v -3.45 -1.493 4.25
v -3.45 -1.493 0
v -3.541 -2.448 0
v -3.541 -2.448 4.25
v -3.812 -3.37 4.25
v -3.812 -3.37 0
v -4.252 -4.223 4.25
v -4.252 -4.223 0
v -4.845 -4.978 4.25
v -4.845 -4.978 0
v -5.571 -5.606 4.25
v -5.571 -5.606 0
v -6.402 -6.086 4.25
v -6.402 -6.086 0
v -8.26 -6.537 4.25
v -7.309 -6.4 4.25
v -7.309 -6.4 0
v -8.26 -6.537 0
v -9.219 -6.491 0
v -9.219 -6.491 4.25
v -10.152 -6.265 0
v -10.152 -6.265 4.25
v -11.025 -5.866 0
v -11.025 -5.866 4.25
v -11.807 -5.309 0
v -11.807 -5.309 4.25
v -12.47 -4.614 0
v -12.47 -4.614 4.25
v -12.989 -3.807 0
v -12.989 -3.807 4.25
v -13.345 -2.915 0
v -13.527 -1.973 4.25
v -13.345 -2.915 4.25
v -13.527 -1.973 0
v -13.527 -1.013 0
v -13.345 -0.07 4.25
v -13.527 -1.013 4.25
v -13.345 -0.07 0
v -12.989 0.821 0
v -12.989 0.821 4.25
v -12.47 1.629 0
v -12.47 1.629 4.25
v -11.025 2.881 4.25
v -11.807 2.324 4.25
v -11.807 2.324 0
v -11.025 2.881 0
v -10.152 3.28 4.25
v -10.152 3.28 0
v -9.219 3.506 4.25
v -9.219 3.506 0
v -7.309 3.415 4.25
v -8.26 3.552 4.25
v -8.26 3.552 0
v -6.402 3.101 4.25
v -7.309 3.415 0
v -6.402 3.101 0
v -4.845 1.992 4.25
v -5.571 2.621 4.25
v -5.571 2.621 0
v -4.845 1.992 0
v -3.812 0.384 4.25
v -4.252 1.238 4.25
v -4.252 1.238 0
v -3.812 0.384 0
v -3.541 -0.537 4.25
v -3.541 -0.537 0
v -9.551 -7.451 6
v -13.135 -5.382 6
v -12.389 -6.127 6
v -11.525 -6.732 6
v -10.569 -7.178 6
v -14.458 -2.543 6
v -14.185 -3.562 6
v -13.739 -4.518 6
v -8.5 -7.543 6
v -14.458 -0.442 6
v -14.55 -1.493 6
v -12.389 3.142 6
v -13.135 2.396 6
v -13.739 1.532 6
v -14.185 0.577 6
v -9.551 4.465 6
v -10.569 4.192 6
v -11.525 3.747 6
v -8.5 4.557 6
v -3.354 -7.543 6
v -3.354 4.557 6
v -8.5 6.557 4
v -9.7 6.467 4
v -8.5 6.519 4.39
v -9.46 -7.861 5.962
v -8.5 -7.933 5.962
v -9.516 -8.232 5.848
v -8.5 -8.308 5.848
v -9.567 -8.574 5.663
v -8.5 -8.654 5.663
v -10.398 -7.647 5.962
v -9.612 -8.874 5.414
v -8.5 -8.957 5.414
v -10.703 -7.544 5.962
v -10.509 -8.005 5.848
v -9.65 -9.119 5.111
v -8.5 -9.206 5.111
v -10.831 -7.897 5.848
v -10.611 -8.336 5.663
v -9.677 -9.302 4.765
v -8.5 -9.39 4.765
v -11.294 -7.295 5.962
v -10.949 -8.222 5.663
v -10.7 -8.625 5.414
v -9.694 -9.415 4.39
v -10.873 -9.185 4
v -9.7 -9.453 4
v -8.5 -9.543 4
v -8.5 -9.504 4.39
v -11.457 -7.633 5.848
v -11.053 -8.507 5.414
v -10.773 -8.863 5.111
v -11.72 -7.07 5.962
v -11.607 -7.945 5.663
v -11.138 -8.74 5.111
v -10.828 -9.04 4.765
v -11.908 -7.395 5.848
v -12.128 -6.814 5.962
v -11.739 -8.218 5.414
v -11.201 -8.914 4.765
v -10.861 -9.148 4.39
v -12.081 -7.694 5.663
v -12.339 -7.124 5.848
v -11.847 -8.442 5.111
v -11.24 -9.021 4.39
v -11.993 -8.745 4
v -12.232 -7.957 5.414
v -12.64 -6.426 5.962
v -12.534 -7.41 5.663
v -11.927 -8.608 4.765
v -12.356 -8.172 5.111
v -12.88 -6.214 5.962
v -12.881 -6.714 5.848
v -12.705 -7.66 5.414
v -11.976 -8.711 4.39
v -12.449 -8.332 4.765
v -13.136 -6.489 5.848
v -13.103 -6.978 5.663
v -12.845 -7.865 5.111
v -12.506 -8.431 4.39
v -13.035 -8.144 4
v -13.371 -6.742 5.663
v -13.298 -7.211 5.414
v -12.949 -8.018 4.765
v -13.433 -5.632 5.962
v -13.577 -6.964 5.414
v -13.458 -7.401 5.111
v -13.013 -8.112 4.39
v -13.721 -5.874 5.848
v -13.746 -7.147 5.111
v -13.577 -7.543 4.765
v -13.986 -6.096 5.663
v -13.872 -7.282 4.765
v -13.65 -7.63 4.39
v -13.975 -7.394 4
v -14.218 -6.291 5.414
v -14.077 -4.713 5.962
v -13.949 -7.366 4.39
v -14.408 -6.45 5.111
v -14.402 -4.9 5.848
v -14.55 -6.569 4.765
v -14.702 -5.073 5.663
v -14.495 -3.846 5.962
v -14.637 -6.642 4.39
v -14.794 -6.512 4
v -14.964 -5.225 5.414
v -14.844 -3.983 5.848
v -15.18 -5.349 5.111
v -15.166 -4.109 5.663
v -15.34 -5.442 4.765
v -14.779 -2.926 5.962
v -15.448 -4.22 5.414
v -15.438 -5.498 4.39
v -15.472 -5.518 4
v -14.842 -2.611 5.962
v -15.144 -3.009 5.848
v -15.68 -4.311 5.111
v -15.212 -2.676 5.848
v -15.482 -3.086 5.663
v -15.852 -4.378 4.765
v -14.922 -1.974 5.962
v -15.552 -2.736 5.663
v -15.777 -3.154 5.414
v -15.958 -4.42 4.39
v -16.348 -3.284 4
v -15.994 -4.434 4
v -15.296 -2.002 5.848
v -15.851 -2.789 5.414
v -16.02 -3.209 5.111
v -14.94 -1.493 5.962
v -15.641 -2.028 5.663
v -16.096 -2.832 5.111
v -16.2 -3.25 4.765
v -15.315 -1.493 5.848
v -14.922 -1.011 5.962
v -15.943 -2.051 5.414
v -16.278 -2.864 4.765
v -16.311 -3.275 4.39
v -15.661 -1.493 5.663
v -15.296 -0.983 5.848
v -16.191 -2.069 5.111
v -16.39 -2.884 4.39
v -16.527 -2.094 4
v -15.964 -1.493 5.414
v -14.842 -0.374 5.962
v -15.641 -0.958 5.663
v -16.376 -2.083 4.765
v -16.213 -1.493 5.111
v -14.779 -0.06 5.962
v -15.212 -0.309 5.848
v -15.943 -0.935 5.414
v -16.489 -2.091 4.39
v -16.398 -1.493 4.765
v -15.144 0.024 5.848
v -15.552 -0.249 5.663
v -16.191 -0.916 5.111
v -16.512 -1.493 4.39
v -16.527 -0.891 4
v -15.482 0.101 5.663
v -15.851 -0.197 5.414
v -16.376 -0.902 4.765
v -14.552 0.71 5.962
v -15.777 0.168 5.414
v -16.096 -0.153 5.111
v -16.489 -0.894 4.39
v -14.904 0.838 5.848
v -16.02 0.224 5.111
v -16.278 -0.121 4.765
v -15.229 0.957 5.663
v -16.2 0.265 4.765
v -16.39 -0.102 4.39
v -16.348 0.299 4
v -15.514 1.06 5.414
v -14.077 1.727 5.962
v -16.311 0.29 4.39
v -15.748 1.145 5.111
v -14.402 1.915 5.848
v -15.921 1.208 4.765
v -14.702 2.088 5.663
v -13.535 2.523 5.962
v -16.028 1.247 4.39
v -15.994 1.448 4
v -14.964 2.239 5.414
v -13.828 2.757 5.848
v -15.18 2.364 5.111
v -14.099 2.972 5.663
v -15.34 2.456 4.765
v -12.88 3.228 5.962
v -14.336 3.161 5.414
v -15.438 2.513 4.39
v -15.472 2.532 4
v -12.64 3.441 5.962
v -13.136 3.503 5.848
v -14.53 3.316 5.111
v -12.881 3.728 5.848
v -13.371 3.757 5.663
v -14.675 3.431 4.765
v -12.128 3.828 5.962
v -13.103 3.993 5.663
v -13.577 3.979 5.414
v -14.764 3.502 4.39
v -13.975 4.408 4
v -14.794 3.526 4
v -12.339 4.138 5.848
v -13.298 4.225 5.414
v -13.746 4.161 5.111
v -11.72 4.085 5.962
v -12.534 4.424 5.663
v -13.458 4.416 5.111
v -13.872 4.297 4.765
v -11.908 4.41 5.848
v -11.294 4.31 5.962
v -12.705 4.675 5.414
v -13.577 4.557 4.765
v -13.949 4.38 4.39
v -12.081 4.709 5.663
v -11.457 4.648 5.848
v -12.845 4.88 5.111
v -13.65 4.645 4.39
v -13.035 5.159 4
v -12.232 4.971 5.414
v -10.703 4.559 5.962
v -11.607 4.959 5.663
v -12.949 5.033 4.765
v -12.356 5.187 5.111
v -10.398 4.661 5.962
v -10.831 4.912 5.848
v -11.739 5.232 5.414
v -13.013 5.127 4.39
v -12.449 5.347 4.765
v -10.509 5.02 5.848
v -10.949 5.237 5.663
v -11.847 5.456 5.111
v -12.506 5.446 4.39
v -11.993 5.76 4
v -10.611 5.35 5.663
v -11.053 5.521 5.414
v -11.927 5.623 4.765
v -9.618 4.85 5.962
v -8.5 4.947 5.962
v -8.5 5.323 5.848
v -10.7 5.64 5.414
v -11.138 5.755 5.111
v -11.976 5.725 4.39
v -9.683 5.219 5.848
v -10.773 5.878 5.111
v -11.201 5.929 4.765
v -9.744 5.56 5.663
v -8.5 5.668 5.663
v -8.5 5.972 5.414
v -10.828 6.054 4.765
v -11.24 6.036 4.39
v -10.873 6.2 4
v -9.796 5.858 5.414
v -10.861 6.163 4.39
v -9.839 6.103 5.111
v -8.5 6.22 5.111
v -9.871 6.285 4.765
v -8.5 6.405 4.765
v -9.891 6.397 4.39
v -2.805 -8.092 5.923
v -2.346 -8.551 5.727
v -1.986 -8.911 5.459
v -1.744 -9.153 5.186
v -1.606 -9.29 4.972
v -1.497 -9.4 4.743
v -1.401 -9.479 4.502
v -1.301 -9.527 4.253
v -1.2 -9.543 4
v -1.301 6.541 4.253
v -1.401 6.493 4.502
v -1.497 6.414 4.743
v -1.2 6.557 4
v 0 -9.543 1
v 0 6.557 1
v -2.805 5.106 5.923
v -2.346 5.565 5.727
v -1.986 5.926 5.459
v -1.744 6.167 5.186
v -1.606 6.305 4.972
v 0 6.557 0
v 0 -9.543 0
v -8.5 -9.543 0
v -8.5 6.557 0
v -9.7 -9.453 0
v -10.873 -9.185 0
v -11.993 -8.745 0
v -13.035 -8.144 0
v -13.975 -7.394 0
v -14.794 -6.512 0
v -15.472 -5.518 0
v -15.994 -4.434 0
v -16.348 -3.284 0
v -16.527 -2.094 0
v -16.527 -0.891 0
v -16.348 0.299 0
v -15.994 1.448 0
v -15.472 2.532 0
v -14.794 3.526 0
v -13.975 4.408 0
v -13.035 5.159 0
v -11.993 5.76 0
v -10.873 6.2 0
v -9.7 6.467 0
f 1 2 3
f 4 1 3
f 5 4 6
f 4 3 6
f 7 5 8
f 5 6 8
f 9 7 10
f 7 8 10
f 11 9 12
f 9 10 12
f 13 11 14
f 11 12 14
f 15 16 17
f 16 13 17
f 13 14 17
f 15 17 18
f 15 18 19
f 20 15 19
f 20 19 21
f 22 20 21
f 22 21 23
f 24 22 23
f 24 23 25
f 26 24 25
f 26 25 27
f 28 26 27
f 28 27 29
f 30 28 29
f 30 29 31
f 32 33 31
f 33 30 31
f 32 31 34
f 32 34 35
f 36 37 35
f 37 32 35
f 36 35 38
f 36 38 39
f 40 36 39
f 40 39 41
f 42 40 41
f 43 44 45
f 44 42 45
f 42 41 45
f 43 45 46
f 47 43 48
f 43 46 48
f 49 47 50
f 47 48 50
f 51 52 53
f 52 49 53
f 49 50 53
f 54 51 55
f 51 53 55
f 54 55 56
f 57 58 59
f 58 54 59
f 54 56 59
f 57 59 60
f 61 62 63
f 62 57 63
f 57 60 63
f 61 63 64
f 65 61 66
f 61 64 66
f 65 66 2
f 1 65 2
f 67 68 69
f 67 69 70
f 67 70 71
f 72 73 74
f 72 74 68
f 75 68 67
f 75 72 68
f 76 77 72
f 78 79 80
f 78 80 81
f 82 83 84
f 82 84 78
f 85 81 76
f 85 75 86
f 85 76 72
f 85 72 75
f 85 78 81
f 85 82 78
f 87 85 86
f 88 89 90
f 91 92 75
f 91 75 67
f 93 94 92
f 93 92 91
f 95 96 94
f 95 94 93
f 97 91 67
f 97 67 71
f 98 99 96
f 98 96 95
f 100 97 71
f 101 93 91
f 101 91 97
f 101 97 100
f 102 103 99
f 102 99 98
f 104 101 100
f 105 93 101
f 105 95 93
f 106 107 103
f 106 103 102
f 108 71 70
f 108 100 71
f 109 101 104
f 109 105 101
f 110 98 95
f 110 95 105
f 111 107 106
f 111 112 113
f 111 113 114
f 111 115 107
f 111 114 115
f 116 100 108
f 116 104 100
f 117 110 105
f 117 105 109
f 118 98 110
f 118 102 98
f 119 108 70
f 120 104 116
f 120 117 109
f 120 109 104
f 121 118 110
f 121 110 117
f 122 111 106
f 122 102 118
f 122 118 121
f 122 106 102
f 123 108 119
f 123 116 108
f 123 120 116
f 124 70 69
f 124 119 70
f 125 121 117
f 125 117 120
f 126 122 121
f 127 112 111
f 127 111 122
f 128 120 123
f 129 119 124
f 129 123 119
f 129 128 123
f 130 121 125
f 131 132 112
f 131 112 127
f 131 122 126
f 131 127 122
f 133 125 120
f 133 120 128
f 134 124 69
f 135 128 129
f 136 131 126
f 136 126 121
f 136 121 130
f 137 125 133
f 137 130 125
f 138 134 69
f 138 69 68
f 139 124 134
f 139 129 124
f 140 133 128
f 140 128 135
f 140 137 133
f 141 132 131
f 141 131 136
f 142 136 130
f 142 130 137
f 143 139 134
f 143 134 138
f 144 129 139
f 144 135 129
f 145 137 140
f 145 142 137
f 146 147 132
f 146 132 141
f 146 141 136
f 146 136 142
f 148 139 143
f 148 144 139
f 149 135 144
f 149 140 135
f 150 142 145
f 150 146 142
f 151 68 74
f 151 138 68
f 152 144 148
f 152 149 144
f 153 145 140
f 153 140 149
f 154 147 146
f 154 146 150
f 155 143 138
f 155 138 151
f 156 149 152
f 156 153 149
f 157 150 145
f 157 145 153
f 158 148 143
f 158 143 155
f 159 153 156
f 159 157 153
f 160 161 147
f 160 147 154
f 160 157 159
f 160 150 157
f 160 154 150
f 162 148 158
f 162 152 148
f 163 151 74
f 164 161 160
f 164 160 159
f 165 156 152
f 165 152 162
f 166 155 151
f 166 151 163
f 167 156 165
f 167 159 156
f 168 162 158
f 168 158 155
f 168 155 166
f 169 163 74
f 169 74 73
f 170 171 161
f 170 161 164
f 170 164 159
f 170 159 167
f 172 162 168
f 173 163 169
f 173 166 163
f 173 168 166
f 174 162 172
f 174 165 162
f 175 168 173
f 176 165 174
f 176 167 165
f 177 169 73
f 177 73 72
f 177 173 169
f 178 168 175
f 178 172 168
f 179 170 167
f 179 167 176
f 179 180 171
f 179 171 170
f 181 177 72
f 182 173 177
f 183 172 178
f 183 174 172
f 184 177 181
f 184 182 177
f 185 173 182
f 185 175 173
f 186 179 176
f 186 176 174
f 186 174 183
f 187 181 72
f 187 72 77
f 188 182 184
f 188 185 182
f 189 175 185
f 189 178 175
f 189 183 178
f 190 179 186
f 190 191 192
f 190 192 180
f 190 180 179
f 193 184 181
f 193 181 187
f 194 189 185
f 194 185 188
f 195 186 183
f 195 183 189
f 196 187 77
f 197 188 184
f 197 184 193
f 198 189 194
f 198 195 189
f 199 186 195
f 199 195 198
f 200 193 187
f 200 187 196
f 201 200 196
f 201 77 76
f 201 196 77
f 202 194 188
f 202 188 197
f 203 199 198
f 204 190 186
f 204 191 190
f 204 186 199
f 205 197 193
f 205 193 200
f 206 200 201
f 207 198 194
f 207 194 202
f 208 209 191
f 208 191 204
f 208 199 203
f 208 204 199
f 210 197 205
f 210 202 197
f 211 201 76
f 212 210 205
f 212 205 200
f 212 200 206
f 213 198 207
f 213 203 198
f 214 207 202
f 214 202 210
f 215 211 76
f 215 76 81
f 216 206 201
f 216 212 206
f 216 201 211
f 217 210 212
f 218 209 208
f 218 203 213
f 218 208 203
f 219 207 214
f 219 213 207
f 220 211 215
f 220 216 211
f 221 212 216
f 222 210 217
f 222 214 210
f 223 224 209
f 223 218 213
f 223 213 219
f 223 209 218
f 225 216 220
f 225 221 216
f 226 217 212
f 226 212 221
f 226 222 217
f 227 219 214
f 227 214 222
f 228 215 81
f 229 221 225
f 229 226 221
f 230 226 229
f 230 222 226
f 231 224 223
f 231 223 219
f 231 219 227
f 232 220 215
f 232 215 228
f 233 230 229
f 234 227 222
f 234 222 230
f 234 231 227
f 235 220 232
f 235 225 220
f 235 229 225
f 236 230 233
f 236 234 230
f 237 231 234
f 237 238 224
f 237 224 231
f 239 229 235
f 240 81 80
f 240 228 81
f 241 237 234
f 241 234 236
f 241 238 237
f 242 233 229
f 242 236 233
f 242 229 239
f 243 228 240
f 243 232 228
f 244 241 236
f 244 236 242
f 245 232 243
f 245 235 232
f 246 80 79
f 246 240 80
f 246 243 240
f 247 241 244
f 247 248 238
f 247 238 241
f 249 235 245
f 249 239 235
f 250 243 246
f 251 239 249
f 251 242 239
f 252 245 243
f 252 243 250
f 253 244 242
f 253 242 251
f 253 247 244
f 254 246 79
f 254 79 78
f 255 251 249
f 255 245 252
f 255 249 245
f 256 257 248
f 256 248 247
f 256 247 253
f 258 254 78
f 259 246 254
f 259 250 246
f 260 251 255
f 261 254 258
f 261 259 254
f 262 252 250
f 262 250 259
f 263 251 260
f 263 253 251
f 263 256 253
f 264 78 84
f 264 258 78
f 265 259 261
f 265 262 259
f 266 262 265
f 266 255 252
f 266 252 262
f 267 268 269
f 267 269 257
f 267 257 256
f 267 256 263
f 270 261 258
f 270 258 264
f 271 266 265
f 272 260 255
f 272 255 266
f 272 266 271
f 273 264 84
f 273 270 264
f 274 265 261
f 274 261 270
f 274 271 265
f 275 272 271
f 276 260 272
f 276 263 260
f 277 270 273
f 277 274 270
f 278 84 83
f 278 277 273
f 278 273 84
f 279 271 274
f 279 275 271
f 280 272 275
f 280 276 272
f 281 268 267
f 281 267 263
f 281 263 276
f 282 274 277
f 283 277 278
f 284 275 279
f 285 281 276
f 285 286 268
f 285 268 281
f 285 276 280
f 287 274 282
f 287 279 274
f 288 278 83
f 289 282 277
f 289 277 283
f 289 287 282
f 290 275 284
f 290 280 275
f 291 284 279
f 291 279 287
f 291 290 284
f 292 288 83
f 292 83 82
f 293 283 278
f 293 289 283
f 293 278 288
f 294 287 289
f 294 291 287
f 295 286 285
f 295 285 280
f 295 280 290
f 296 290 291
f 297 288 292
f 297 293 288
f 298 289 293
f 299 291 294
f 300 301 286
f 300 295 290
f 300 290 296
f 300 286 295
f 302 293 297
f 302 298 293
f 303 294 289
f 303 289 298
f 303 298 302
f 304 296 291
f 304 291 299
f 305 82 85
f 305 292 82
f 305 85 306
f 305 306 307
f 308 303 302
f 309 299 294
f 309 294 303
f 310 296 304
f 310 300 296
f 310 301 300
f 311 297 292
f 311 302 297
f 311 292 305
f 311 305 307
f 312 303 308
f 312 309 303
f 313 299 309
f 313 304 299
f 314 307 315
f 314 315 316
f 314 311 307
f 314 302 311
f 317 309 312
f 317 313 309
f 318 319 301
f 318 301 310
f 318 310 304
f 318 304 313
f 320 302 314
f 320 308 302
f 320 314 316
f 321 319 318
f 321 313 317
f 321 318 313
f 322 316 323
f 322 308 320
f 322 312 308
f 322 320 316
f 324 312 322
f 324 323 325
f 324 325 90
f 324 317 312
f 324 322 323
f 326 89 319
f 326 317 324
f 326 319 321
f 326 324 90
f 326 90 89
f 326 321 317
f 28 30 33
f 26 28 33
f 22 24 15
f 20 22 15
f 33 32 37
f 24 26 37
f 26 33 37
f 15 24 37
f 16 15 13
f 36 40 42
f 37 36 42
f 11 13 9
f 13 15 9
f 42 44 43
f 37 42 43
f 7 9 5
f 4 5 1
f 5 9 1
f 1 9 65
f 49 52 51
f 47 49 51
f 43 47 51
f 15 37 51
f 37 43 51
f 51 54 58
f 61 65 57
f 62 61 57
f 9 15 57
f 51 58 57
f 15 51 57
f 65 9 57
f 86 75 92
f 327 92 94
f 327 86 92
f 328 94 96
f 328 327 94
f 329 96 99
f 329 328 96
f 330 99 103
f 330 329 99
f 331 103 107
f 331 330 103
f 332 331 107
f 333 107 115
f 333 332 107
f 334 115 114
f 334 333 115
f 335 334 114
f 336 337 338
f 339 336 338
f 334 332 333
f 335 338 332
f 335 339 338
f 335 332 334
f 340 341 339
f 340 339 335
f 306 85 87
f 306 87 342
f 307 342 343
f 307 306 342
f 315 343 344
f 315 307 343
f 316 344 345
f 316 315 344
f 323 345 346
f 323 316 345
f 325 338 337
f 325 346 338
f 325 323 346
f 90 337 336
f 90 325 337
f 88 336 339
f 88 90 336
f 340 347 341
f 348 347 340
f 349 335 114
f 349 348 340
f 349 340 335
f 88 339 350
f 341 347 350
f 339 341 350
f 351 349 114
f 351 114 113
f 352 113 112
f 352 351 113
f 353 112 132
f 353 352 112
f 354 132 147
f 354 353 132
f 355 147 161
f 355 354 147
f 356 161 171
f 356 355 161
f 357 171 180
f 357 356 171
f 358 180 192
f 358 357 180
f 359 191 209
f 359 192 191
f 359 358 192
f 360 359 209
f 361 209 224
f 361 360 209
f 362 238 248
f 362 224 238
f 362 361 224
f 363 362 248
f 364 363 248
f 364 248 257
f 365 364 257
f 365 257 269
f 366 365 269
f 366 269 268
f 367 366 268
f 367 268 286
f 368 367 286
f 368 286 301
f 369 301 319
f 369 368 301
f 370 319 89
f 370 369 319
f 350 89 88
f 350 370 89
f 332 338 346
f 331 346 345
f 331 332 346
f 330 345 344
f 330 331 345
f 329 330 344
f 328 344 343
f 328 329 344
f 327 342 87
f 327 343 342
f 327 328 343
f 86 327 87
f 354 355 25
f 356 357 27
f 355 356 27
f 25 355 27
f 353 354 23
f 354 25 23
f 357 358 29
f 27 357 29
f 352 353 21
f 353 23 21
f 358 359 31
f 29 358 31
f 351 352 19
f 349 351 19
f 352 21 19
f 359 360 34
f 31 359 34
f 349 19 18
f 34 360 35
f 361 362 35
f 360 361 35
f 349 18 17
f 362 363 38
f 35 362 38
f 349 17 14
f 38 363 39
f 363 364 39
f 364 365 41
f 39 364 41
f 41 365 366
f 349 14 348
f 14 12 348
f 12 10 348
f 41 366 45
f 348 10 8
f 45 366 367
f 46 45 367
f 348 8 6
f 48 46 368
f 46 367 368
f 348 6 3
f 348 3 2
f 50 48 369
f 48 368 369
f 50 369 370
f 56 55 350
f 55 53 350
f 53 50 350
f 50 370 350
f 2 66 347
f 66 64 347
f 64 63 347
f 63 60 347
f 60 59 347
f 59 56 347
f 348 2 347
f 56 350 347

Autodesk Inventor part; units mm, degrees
ref_plane "YZ Plane" through (0, 0, 0) normal (1, 0, 0) x (0, 1, 0)
ref_plane "XZ Plane" through (0, 0, 0) normal (0, 1, 0) x (-1, 0, 0)
ref_plane "XY Plane" through (0, 0, 0) normal (0, 0, 1) x (1, 0, 0)
sketch "Szkic1" plane through (0, 0, 0) normal (0, 0, 1) x (1, 0, 0)
  line L0 (0, 6.5573) -> (0, -9.5427)
  circle A0 centre (-8.5, -1.4927) radius 5.05
  arc A1 (-8.5, 6.5573) -> (-8.5, -9.5427) centre (-8.5, -1.4927) ccw
  line L1 (0, 6.5573) -> (-8.5, 6.5573)
  line L2 (0, -9.5427) -> (-8.5, -9.5427)
  point P0 (0, 0)
  dimension "d0" = 16.1
  dimension "d1" = 8.5
  dimension "d2" = 10.1
  dimension "d3" = 8.05
  dimension "d4" = 3
extrude "Wyciągnięcie proste1" add sketch "Szkic1" along normal blind 6 contours L0 L2 A1 L1 | A0
chamfer "Faza1" distance 2 distance2 5 1 edges at (0, -1.4927, 6) measured on face at (-2.8333, -4.176, 6)
extrude "Wyciągnięcie proste2" cut sketch "Szkic1" along normal blind 4.25 contours A0
fillet "Zaokrąglenie1" radius 2 4 edges at (-16.55, -1.4927, 6) (-5.25, -9.5427, 6) (-5.25, 6.5573, 6) (-2, -1.4927, 6)
equation "\"d3\" = 0.5 * d0"
properties part number "3DP_ABS_Front_Door_Magnet_Holder"
